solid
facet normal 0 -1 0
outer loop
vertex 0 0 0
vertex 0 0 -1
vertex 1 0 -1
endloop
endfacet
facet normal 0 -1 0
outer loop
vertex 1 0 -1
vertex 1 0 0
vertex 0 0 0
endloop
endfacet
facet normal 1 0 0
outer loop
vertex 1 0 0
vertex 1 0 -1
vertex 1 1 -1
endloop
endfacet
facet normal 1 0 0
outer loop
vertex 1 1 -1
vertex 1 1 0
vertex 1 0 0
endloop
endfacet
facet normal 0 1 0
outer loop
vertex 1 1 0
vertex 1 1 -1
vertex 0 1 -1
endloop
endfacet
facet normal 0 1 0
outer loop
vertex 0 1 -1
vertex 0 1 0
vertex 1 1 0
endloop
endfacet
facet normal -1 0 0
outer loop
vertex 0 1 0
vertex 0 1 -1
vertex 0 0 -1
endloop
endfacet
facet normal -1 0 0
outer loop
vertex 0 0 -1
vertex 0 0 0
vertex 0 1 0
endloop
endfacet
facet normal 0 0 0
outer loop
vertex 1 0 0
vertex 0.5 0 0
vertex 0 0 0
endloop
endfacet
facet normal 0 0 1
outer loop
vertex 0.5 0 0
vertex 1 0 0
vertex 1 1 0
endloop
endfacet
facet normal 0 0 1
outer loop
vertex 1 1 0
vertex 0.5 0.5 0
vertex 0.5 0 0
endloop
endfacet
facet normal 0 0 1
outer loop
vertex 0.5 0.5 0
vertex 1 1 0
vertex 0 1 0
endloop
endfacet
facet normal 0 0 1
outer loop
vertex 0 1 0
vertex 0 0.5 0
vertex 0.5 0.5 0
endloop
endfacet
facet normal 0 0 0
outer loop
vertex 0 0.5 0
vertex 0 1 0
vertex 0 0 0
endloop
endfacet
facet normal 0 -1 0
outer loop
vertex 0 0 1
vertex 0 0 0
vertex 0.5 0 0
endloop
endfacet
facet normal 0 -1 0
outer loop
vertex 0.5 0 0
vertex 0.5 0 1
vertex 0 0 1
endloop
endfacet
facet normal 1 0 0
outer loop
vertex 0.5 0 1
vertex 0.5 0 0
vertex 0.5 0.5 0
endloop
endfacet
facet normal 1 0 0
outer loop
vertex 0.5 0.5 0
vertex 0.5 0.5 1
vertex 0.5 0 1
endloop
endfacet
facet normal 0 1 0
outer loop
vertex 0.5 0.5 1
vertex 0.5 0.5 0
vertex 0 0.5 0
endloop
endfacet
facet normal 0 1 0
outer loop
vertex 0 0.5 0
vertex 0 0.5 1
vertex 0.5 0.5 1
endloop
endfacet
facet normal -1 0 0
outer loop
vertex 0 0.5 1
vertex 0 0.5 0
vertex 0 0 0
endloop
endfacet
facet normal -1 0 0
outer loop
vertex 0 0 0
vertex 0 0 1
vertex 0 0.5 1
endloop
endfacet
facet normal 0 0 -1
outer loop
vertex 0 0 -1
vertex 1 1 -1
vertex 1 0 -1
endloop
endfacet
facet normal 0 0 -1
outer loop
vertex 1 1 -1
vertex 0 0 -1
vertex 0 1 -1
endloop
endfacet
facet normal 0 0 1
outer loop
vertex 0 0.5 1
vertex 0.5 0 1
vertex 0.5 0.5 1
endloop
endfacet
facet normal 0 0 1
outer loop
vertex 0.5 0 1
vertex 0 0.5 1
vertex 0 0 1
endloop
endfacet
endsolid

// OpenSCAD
// file: triangulation.scad
function _furthestAwayFromPoint(points,poly,z,bestD=-1,bestPos=0,pos=0) = 
    len(poly) <= pos ? bestPos :
    norm(points[poly[pos]]-z) > bestD ? _furthestAwayFromPoint(points,poly,z,bestD=norm(points[poly[pos]]-z),bestPos=pos,pos=pos+1) :
    _furthestAwayFromPoint(points,poly,z,bestD=bestD,bestPos=bestPos,pos=pos+1);
    
function _triangleArea(a,b,c) = let(cr=cross(b-a,c-a)/2)
        is_num(cr) ? abs(cr) : norm(cr);
    
function _furthestAwayFromLine(points,poly,z1,z2,bestArea=-1,bestPos=0,pos=0) = 
    len(poly) <= pos ? bestPos :
    _triangleArea(z1,z2,points[poly[pos]]) > bestArea ? _furthestAwayFromLine(points,poly,z1,z2,bestArea=_triangleArea(z1,z2,points[poly[pos]]),bestPos=pos,pos=pos+1) :
    _furthestAwayFromLine(points,poly,z1,z2,bestArea=bestArea,bestPos=bestPos,pos=pos+1);
    
function normalize(v) = v/norm(v);

function _winding(points,poly,sum=0,pos=0) =
    pos >= len(poly) ? sum :
    _winding(points,poly,sum=sum+(points[poly[(pos+1)%len(poly)]][0]-points[poly[pos]][0])*(points[poly[(pos+1)%len(poly)]][1]+points[poly[pos]][1]),pos=pos+1);

function _isCCW(points,poly) =
_winding(points,poly) < 0;

function identifyPlane(points,poly) = 
let(i=_furthestAwayFromPoint(points,poly,points[poly[0]]),
           j=_furthestAwayFromLine(points,poly,points[poly[0]],points[poly[i]]),
           normal = cross(points[poly[i]]-points[poly[0]],points[poly[j]]-points[poly[0]]),
           a = points[poly[i]]-points[poly[0]],
           b = cross(normal,a),
           cs = [points[poly[0]],normalize(a),normalize(b),normalize(normal)])
           cs;
                      
function projectPoint(coordsys,p) = let(v=p-coordsys[0],
           vp=v-(v*coordsys[3])*coordsys[3]) [vp*coordsys[1],vp*coordsys[2]];
           
function projectPoints(coordsys,p) = [for(v=p) projectPoint(coordsys,v)];
    
function _removeDuplicates(points,poly)
    = [for (i=[0:len(poly)-1]) if (points[poly[(i+1)%len(poly)]] != points[poly[i]]) poly[i]];
    
function triangulate(points,poly=undef,holes=[]) = 
    let(poly = poly==undef ? [for(i=[0:1:len(points)-1]) i] : poly)
    let(poly = _removeDuplicates(points,poly),
        holes = [for(h=holes) _removeDuplicates(points,h)])
    len(points[poly[0]]) == 2 ?triangulate2D(points,poly,holes) : triangulate2D(projectPoints(identifyPlane(points,poly),points),poly,holes);
    
function _leftMostHoleData(points,holes,indexOfHole=0,indexInHole=0,bestData=undef,) =
    indexOfHole >= len(holes) ? bestData[1] :
    indexInHole >= len(holes[indexOfHole]) ? _leftMostHoleData(points,holes,indexOfHole=indexOfHole+1,indexInHole=0,bestData=bestData) :
    bestData==undef || points[holes[indexOfHole][indexInHole]][0] < bestData[0] ? _leftMostHoleData(points,holes,indexOfHole=indexOfHole,indexInHole=indexInHole+1,bestData=[points[holes[indexOfHole][indexInHole]][0], [indexOfHole, indexInHole]]) :
    _leftMostHoleData(points,holes,indexOfHole=indexOfHole,indexInHole=indexInHole+1,bestData=bestData);
    
function _rightMostPrimaryData(points,primary,limitX,pos=0,bestData=undef) =   
    pos >= len(primary) ?  bestData[1] :    
    points[primary[pos]][0] < limitX && (bestData==undef || points[primary[pos]] > bestData[0]) ?  _rightMostPrimaryData(points,primary,limitX,pos=pos+1,bestData=[points[primary[pos]][0],pos]) :
    _rightMostPrimaryData(points,primary,limitX,pos=pos+1,bestData=bestData);

function _makeLoop(start,loop,index) = concat([start],[for(i=[0:len(loop)]) loop[(i+index)%len(loop)]],[start]);

function _addLoop(primary,holes,indexWithinPrimary,indexOfHole,indexWithinHole) = 
    let(hole=holes[indexOfHole],
        newHoles=[for(i=[0:len(holes)-1]) if(i!=indexOfHole) holes[i]],
        newPrimary=[for(i=[0:len(primary)-1]) for(p= i!=indexWithinPrimary ? [primary[i]] : _makeLoop(primary[i],hole,indexWithinHole)) p])
       [newPrimary,newHoles];
        
function _removeHoles1(points,primary,holes) =
    len(holes) == 0 ? primary :
    let(holeData=_leftMostHoleData(points,holes),
        indexOfHole=holeData[0],
        indexWithinHole=holeData[1],
        holePointIndex=holes[indexOfHole][indexWithinHole],
        hp=points[holePointIndex],
        indexWithinPrimary=_rightMostPrimaryData(points,primary,hp[0]),
        primaryAndHoles=_addLoop(primary,holes,indexWithinPrimary,indexOfHole,indexWithinHole)) _removeHoles1(points,primaryAndHoles[0],primaryAndHoles[1]);   
        
function _removeHolesAndReorient(points,primary,holes) =    let(points=_isCCW(points,primary)?points:[for(p=points) [p[0],-p[1]]])
        [points,_removeHoles1(points,primary,[for(h=holes) _orient(newPoints,h,ccw=false)])];

function mod(a,b) = let(m=a%b) m < 0 ? m+b : m;

function _delPoint(v,i) = [for(j=[0:1:len(v)-1]) if(i!=j) v[j]];
    
function _isCCWTriangle(a,b,c) = cross(b-a,c-a) >= 0;
    
function _crosses(points,poly,a,b,ignore,pos=0) =     
    pos >= len(poly) ? false :
    ignore != pos && ignore !=  mod(pos+1,len(poly)) && _isCross(points[poly[pos]],points[poly[mod(pos+1,len(poly))]],a,b) ? true : _crosses(points,poly,a,b,pos=pos+1);

function _isReflex(points,poly,i) = 
    let(n=len(poly),
        a=points[poly[mod(i-1,n)]],
        b=points[poly[i]],
        c=points[poly[mod(i+1,n)]]) cross(b-a,c-b) < 0;
                
function _checkEar2(points,poly,a,b,c,j) = 
   let(p=points[poly[mod(j,len(poly))]],
       c1=cross(p-a,b-a))
       ! ( c1*cross(p-b,c-b) >0 && c1*cross(p-c,a-c)>0 );
                
function _checkEar(points,poly,a,b,c,i,j) =
    mod(j,len(poly))==mod(i-1,len(poly)) ? true :
    _isReflex(points,poly,mod(j,len(poly))) && ! _checkEar2(points,poly,a,b,c,j) ? false :
    _checkEar(points,poly,a,b,c,i,j+1);

function _isEar(points,poly,i) = 
    _isReflex(points,poly,i) ? false :
    let(n=len(poly),
        a=points[poly[mod(i-1,n)]],
        b=points[poly[i]],
        c=points[poly[mod(i+1,n)]],
        j=i+2)
        _checkEar(points,poly,a,b,c,i,i+2);        

function _findEar(points,poly,pos=0) =
    assert(pos<len(poly))
    _isEar(points,poly,pos) ? pos : _findEar(points,poly,pos=pos+1);

function _cutEar(points,poly) = 
    let(n=len(poly),
        i=_findEar(points,poly))
        _delPoint(poly,i);
            
function _getEar(points,poly) = 
    let(n=len(poly),
        i=_findEar(points,poly))
        [poly[mod(i-1,n)],poly[i],poly[mod(i+1,n)]];
        
function _reverse(v) = [for(i=[len(v)-1:-1:0]) v[i]];
    
function _orient(points,poly,ccw=true) = !!_isCCW(points,poly) == ccw ? poly : _reverse(poly);

function triangulate2D(points,poly,holes=[],soFar=[]) =
    let(pp = _removeHolesAndReorient(points,poly,holes),
    points=pp[0],
    poly=pp[1])
    len(poly) == 3 ? concat(soFar,[poly]) :
    triangulate2D(points,_cutEar(points,poly),soFar=concat(soFar,[_getEar(points,poly)]));
    
module showMesh(points,tt,width=1) 
{
    for(t=tt) {
        for(i=[0:1:len(t)-1]) {
            hull() {
                translate(points[t[i]]) sphere(d=width);
                translate(points[t[(i+1)%len(t)]]) sphere(d=width);
            }
        }
    }
}

function _find(needle,haystack) = let(f=search([needle], haystack)) f==[[]] ? undef : f[0];

function _refineTriangle(triangle,maxEdge) =
    let(a = triangle[0],
        b = triangle[1],
        c = triangle[2],
        ab = norm(a-b),
        bc = norm(b-c),
        ca = norm(c-a))
        ab <= maxEdge && bc <= maxEdge && ca <= maxEdge ? [triangle] :
        ab > maxEdge && bc > maxEdge && ca > maxEdge ? [[a,(a+b)/2,(a+c)/2],[b,(b+c)/2,(a+b)/2],[c,(a+c)/2,(b+c)/2],[(a+c)/2,(a+b)/2,(b+c)/2]] :
    ab > maxEdge && bc > maxEdge ? [[b,(b+c)/2,(a+b)/2],[a,(a+b)/2,(b+c)/2],[c,a,(b+c)/2]] :
    bc > maxEdge && ca > maxEdge ? [[c,(c+a)/2,(b+c)/2],[b,(b+c)/2,(c+a)/2],[a,b,(c+a)/2]] :
    ca > maxEdge && ab > maxEdge ? [[a,(a+b)/2,(c+a)/2],[c,(c+a)/2,(a+b)/2],[b,c,(a+b)/2]] :
    ab > maxEdge ? [[a,(a+b)/2,c],[(a+b)/2,b,c]] :
    bc > maxEdge ? [[b,(b+c)/2,a],[(b+c)/2,c,a]] :
    /*ca > maxEdge */ [[c,(c+a)/2,b],[(c+a)/2,a,b]];

function _refineMesh1(triangles,maxEdge,pos=0,newTriangles=[]) =
    pos >= len(triangles) ? newTriangles :
    _refineMesh1(triangles,maxEdge,pos=pos+1,newTriangles=concat(newTriangles,_refineTriangle(triangles[pos],maxEdge)));
    
/* simpler but slower */
function _refineMesh1(triangles,maxEdge) =
    [for(t=triangles) for(tr=_refineTriangle(t,maxEdge)) tr];


function _maxEdge(faces) = max([for(f=faces) for(i=[0:len(f)-1]) norm(f[(i+1)%len(f)]-f[i])]);

function _refineMeshN(triangles,maxEdge,n=0) =
    n <= 0 ? triangles : _refineMeshN(_refineMesh1(triangles,maxEdge),maxEdge,n=n-1);
    
function _newPointsAndFaces(pointsAndFaces,face,faceSoFar=[]) =
    let(pos=len(faceSoFar),
        points=pointsAndFaces[0],
        faces=pointsAndFaces[1]
    )
    pos >= len(face) ? [points,concat(faces,[faceSoFar])] :
    let(v=face[pos],
        i=_find(v,points)) i==undef ? _newPointsAndFaces([concat(points,[v]),faces],face,faceSoFar=concat(faceSoFar,[len(points)])) : _newPointsAndFaces(pointsAndFaces,face,faceSoFar=concat(faceSoFar,[i]));            
        
function _toPointsAndFaces(faces,pointsAndFaces=[[],[]], pos=0) =
    pos >= len(faces) ? pointsAndFaces :
    _toPointsAndFaces(faces,_newPointsAndFaces(pointsAndFaces,faces[pos]),pos=pos+1);
    
function refineMesh(mesh=undef,points=[],triangles=[],maxEdge=5) =
    let(
        points=mesh==undef?points:mesh[0],
        triangles=mesh==undef?triangles:mesh[1],
        tris = [for (t=triangles) [for (v=t) points[v]]],
        longestEdge = _maxEdge(tris),
        n = ceil(ln(longestEdge/maxEdge)/ln(2)),
        newTris = _refineMeshN(tris, maxEdge, n)) _toPointsAndFaces(newTris);
    
function _cutZ(a,b,z,normal) =
    let(an = a*normal)
        an == z ? a :
        let(bn = b*normal)
        bn == z ? b :
        let(t=(z-a*normal)/(b*normal-a*normal))
        (1-t)*a+t*b;
    
function _cutTriangle0(t, z, normal) = 
    /* cut lines joining vertex 0 to others */
    t[1]*normal == z ?
    let(cut02 = _cutZ(t[0],t[2],z,normal))
    [[cut02,t[0],t[1]],[cut02,t[1],t[2]]] :
    t[2][2] == z ?
    let(cut01 = _cutZ(t[0],t[1],z,normal))
    [[cut01,t[2],t[0]],[cut01,t[1],t[2]]] :
    let(cut01 = _cutZ(t[0],t[1],z,normal),
        cut02 = _cutZ(t[0],t[2],z,normal))
    [[cut02,t[0],cut01],
     [t[1],t[2],cut02],
     [cut02,cut01,t[1]]];

function _cutTriangle(t,z,normal) = 
    (t[0]*normal <= z && t[1]*normal <= z && t[2]*normal <= z) || (t[0]*normal >= z && t[1]*normal >= z && t[2]*normal >= z ) ? [t] :
    (t[0]*normal >= z && t[1]*normal >= z) || (t[0]*normal <= z && t[1]*normal <= z) ? _cutTriangle0([t[2],t[0],t[1]], z,normal) :
    (t[1]*normal >= z && t[2]*normal >= z) || (t[1]*normal <= z && t[2]*normal <= z) ? _cutTriangle0(t, z, normal) :
    _cutTriangle0([t[1],t[2],t[0]],z, normal);

function cutMesh(mesh=undef,points=[],triangles=[],slice=0,normal=[1,0,0]) =
        sliceMesh(mesh=mesh,points=points,triangles=triangles,slices=[slice],normal=normal);
            
function _normalize(v) = 
    let(vv = 
        v[0] == 0 && v[1] == 0 ? [0,0,sign(v[2])] :
        v[0] == 0 && v[2] == 0 ? [0,sign(v[1]),0] :
        v[1] == 0 && v[2] == 0 ? [sign(v[0]),0,0] :
        v / norm(v))
        [for(i=[0:1:len(v)-1]) vv[i]];
            
function _sliceTriangles(triangles,slices,normal,pos=0) =
    pos >= len(slices) ? triangles :
    _sliceTriangles([for(t=triangles) for(s=_cutTriangle(t,slices[pos],normal)) s],slices,normal,pos=pos+1);
        
function _makeSlices(points,triangles,slices,normal,spacing) =
    slices != undef ? slices :
    let(zs = [for(t=triangles) for(v=t) points[v]*normal],
        zMin = min(zs),
        zMax = max(zs),
        n = ceil((zMax-zMin) / spacing)-1)
        echo(n)n <= 0 ? [] :
        [for(i=[1:1:n]) zMin+i*spacing];    

function sliceMesh(mesh=undef,points=[],triangles=[],slices=undef,spacing=undef,normal=[1,0,0]) =
        let(points=mesh==undef?points:mesh[0],triangles=mesh==undef?triangles:mesh[1],
        normal=_normalize(normal),
        slices=_makeSlices(points,triangles,slices,normal,spacing))
        _toPointsAndFaces(_sliceTriangles([for(t=triangles) [for (v=t) points[v]]],slices,normal));
            
function _origin(dimensions) = [for(i=[0:1:dimensions-1]) 0];        
            
function _cmCalc(points,triangles,pos=0,weightedSum=undef,sumWeights=0) =
        pos >= len(triangles) ?  weightedSum/sumWeights :
        _cmCalc(points,triangles,pos=pos+1,weightedSum=(weightedSum==undef?_origin(len(points[0])):weightedSum)+_triangleArea(points[triangles[pos][0]],points[triangles[pos][1]],points[triangles[pos][2]])*(points[triangles[pos][0]]+points[triangles[pos][1]]+points[triangles[pos][2]])/3,sumWeights=sumWeights+_triangleArea(points[triangles[pos][0]],points[triangles[pos][1]],points[triangles[pos][2]]));
    
function centerOfMass(mesh=undef,points=[],triangles=[]) =
        let(points=mesh==undef?points:mesh[0],triangles=mesh==undef?triangles:mesh[1])
        _cmCalc(points,triangles);
        
//<skip>
/*
function testPoly2(n) = concat([for(i=[0:n-1]) 20*[cos(i*360/n),rands(-.3,.3,1)[0],sin(i*360/n)]],[for(i=[0:n-1]) 20*[0.8*cos(i*360/n),rands(-.3,.3,1)[0],-0.8*sin(i*360/n)]]);

testPoints=testPoly2(11);
tt = triangulate(testPoints);
m = refineMesh(points=testPoints,triangles=tt,maxEdge=5);
showMesh(m[0],m[1],width=.2);
*/
//</skip>
// main file
use <tubemesh.scad>;

sections = [
    [ [0,0,-1], [1,0,-1], [1,1,-1], [0,1,-1] ],
    [ [0,0,0], [1,0,0], [1,1,0], [0,1,0] ],
    [ [0,0,0], [0.5,0,0], [0.5,0.5,0], [0,0.5,0] ],
    [ [0,0,1], [0.5,0,1], [0.5,0.5,1], [0,0.5,1] ] ];

tubeMesh(sections,optimize=false);      
